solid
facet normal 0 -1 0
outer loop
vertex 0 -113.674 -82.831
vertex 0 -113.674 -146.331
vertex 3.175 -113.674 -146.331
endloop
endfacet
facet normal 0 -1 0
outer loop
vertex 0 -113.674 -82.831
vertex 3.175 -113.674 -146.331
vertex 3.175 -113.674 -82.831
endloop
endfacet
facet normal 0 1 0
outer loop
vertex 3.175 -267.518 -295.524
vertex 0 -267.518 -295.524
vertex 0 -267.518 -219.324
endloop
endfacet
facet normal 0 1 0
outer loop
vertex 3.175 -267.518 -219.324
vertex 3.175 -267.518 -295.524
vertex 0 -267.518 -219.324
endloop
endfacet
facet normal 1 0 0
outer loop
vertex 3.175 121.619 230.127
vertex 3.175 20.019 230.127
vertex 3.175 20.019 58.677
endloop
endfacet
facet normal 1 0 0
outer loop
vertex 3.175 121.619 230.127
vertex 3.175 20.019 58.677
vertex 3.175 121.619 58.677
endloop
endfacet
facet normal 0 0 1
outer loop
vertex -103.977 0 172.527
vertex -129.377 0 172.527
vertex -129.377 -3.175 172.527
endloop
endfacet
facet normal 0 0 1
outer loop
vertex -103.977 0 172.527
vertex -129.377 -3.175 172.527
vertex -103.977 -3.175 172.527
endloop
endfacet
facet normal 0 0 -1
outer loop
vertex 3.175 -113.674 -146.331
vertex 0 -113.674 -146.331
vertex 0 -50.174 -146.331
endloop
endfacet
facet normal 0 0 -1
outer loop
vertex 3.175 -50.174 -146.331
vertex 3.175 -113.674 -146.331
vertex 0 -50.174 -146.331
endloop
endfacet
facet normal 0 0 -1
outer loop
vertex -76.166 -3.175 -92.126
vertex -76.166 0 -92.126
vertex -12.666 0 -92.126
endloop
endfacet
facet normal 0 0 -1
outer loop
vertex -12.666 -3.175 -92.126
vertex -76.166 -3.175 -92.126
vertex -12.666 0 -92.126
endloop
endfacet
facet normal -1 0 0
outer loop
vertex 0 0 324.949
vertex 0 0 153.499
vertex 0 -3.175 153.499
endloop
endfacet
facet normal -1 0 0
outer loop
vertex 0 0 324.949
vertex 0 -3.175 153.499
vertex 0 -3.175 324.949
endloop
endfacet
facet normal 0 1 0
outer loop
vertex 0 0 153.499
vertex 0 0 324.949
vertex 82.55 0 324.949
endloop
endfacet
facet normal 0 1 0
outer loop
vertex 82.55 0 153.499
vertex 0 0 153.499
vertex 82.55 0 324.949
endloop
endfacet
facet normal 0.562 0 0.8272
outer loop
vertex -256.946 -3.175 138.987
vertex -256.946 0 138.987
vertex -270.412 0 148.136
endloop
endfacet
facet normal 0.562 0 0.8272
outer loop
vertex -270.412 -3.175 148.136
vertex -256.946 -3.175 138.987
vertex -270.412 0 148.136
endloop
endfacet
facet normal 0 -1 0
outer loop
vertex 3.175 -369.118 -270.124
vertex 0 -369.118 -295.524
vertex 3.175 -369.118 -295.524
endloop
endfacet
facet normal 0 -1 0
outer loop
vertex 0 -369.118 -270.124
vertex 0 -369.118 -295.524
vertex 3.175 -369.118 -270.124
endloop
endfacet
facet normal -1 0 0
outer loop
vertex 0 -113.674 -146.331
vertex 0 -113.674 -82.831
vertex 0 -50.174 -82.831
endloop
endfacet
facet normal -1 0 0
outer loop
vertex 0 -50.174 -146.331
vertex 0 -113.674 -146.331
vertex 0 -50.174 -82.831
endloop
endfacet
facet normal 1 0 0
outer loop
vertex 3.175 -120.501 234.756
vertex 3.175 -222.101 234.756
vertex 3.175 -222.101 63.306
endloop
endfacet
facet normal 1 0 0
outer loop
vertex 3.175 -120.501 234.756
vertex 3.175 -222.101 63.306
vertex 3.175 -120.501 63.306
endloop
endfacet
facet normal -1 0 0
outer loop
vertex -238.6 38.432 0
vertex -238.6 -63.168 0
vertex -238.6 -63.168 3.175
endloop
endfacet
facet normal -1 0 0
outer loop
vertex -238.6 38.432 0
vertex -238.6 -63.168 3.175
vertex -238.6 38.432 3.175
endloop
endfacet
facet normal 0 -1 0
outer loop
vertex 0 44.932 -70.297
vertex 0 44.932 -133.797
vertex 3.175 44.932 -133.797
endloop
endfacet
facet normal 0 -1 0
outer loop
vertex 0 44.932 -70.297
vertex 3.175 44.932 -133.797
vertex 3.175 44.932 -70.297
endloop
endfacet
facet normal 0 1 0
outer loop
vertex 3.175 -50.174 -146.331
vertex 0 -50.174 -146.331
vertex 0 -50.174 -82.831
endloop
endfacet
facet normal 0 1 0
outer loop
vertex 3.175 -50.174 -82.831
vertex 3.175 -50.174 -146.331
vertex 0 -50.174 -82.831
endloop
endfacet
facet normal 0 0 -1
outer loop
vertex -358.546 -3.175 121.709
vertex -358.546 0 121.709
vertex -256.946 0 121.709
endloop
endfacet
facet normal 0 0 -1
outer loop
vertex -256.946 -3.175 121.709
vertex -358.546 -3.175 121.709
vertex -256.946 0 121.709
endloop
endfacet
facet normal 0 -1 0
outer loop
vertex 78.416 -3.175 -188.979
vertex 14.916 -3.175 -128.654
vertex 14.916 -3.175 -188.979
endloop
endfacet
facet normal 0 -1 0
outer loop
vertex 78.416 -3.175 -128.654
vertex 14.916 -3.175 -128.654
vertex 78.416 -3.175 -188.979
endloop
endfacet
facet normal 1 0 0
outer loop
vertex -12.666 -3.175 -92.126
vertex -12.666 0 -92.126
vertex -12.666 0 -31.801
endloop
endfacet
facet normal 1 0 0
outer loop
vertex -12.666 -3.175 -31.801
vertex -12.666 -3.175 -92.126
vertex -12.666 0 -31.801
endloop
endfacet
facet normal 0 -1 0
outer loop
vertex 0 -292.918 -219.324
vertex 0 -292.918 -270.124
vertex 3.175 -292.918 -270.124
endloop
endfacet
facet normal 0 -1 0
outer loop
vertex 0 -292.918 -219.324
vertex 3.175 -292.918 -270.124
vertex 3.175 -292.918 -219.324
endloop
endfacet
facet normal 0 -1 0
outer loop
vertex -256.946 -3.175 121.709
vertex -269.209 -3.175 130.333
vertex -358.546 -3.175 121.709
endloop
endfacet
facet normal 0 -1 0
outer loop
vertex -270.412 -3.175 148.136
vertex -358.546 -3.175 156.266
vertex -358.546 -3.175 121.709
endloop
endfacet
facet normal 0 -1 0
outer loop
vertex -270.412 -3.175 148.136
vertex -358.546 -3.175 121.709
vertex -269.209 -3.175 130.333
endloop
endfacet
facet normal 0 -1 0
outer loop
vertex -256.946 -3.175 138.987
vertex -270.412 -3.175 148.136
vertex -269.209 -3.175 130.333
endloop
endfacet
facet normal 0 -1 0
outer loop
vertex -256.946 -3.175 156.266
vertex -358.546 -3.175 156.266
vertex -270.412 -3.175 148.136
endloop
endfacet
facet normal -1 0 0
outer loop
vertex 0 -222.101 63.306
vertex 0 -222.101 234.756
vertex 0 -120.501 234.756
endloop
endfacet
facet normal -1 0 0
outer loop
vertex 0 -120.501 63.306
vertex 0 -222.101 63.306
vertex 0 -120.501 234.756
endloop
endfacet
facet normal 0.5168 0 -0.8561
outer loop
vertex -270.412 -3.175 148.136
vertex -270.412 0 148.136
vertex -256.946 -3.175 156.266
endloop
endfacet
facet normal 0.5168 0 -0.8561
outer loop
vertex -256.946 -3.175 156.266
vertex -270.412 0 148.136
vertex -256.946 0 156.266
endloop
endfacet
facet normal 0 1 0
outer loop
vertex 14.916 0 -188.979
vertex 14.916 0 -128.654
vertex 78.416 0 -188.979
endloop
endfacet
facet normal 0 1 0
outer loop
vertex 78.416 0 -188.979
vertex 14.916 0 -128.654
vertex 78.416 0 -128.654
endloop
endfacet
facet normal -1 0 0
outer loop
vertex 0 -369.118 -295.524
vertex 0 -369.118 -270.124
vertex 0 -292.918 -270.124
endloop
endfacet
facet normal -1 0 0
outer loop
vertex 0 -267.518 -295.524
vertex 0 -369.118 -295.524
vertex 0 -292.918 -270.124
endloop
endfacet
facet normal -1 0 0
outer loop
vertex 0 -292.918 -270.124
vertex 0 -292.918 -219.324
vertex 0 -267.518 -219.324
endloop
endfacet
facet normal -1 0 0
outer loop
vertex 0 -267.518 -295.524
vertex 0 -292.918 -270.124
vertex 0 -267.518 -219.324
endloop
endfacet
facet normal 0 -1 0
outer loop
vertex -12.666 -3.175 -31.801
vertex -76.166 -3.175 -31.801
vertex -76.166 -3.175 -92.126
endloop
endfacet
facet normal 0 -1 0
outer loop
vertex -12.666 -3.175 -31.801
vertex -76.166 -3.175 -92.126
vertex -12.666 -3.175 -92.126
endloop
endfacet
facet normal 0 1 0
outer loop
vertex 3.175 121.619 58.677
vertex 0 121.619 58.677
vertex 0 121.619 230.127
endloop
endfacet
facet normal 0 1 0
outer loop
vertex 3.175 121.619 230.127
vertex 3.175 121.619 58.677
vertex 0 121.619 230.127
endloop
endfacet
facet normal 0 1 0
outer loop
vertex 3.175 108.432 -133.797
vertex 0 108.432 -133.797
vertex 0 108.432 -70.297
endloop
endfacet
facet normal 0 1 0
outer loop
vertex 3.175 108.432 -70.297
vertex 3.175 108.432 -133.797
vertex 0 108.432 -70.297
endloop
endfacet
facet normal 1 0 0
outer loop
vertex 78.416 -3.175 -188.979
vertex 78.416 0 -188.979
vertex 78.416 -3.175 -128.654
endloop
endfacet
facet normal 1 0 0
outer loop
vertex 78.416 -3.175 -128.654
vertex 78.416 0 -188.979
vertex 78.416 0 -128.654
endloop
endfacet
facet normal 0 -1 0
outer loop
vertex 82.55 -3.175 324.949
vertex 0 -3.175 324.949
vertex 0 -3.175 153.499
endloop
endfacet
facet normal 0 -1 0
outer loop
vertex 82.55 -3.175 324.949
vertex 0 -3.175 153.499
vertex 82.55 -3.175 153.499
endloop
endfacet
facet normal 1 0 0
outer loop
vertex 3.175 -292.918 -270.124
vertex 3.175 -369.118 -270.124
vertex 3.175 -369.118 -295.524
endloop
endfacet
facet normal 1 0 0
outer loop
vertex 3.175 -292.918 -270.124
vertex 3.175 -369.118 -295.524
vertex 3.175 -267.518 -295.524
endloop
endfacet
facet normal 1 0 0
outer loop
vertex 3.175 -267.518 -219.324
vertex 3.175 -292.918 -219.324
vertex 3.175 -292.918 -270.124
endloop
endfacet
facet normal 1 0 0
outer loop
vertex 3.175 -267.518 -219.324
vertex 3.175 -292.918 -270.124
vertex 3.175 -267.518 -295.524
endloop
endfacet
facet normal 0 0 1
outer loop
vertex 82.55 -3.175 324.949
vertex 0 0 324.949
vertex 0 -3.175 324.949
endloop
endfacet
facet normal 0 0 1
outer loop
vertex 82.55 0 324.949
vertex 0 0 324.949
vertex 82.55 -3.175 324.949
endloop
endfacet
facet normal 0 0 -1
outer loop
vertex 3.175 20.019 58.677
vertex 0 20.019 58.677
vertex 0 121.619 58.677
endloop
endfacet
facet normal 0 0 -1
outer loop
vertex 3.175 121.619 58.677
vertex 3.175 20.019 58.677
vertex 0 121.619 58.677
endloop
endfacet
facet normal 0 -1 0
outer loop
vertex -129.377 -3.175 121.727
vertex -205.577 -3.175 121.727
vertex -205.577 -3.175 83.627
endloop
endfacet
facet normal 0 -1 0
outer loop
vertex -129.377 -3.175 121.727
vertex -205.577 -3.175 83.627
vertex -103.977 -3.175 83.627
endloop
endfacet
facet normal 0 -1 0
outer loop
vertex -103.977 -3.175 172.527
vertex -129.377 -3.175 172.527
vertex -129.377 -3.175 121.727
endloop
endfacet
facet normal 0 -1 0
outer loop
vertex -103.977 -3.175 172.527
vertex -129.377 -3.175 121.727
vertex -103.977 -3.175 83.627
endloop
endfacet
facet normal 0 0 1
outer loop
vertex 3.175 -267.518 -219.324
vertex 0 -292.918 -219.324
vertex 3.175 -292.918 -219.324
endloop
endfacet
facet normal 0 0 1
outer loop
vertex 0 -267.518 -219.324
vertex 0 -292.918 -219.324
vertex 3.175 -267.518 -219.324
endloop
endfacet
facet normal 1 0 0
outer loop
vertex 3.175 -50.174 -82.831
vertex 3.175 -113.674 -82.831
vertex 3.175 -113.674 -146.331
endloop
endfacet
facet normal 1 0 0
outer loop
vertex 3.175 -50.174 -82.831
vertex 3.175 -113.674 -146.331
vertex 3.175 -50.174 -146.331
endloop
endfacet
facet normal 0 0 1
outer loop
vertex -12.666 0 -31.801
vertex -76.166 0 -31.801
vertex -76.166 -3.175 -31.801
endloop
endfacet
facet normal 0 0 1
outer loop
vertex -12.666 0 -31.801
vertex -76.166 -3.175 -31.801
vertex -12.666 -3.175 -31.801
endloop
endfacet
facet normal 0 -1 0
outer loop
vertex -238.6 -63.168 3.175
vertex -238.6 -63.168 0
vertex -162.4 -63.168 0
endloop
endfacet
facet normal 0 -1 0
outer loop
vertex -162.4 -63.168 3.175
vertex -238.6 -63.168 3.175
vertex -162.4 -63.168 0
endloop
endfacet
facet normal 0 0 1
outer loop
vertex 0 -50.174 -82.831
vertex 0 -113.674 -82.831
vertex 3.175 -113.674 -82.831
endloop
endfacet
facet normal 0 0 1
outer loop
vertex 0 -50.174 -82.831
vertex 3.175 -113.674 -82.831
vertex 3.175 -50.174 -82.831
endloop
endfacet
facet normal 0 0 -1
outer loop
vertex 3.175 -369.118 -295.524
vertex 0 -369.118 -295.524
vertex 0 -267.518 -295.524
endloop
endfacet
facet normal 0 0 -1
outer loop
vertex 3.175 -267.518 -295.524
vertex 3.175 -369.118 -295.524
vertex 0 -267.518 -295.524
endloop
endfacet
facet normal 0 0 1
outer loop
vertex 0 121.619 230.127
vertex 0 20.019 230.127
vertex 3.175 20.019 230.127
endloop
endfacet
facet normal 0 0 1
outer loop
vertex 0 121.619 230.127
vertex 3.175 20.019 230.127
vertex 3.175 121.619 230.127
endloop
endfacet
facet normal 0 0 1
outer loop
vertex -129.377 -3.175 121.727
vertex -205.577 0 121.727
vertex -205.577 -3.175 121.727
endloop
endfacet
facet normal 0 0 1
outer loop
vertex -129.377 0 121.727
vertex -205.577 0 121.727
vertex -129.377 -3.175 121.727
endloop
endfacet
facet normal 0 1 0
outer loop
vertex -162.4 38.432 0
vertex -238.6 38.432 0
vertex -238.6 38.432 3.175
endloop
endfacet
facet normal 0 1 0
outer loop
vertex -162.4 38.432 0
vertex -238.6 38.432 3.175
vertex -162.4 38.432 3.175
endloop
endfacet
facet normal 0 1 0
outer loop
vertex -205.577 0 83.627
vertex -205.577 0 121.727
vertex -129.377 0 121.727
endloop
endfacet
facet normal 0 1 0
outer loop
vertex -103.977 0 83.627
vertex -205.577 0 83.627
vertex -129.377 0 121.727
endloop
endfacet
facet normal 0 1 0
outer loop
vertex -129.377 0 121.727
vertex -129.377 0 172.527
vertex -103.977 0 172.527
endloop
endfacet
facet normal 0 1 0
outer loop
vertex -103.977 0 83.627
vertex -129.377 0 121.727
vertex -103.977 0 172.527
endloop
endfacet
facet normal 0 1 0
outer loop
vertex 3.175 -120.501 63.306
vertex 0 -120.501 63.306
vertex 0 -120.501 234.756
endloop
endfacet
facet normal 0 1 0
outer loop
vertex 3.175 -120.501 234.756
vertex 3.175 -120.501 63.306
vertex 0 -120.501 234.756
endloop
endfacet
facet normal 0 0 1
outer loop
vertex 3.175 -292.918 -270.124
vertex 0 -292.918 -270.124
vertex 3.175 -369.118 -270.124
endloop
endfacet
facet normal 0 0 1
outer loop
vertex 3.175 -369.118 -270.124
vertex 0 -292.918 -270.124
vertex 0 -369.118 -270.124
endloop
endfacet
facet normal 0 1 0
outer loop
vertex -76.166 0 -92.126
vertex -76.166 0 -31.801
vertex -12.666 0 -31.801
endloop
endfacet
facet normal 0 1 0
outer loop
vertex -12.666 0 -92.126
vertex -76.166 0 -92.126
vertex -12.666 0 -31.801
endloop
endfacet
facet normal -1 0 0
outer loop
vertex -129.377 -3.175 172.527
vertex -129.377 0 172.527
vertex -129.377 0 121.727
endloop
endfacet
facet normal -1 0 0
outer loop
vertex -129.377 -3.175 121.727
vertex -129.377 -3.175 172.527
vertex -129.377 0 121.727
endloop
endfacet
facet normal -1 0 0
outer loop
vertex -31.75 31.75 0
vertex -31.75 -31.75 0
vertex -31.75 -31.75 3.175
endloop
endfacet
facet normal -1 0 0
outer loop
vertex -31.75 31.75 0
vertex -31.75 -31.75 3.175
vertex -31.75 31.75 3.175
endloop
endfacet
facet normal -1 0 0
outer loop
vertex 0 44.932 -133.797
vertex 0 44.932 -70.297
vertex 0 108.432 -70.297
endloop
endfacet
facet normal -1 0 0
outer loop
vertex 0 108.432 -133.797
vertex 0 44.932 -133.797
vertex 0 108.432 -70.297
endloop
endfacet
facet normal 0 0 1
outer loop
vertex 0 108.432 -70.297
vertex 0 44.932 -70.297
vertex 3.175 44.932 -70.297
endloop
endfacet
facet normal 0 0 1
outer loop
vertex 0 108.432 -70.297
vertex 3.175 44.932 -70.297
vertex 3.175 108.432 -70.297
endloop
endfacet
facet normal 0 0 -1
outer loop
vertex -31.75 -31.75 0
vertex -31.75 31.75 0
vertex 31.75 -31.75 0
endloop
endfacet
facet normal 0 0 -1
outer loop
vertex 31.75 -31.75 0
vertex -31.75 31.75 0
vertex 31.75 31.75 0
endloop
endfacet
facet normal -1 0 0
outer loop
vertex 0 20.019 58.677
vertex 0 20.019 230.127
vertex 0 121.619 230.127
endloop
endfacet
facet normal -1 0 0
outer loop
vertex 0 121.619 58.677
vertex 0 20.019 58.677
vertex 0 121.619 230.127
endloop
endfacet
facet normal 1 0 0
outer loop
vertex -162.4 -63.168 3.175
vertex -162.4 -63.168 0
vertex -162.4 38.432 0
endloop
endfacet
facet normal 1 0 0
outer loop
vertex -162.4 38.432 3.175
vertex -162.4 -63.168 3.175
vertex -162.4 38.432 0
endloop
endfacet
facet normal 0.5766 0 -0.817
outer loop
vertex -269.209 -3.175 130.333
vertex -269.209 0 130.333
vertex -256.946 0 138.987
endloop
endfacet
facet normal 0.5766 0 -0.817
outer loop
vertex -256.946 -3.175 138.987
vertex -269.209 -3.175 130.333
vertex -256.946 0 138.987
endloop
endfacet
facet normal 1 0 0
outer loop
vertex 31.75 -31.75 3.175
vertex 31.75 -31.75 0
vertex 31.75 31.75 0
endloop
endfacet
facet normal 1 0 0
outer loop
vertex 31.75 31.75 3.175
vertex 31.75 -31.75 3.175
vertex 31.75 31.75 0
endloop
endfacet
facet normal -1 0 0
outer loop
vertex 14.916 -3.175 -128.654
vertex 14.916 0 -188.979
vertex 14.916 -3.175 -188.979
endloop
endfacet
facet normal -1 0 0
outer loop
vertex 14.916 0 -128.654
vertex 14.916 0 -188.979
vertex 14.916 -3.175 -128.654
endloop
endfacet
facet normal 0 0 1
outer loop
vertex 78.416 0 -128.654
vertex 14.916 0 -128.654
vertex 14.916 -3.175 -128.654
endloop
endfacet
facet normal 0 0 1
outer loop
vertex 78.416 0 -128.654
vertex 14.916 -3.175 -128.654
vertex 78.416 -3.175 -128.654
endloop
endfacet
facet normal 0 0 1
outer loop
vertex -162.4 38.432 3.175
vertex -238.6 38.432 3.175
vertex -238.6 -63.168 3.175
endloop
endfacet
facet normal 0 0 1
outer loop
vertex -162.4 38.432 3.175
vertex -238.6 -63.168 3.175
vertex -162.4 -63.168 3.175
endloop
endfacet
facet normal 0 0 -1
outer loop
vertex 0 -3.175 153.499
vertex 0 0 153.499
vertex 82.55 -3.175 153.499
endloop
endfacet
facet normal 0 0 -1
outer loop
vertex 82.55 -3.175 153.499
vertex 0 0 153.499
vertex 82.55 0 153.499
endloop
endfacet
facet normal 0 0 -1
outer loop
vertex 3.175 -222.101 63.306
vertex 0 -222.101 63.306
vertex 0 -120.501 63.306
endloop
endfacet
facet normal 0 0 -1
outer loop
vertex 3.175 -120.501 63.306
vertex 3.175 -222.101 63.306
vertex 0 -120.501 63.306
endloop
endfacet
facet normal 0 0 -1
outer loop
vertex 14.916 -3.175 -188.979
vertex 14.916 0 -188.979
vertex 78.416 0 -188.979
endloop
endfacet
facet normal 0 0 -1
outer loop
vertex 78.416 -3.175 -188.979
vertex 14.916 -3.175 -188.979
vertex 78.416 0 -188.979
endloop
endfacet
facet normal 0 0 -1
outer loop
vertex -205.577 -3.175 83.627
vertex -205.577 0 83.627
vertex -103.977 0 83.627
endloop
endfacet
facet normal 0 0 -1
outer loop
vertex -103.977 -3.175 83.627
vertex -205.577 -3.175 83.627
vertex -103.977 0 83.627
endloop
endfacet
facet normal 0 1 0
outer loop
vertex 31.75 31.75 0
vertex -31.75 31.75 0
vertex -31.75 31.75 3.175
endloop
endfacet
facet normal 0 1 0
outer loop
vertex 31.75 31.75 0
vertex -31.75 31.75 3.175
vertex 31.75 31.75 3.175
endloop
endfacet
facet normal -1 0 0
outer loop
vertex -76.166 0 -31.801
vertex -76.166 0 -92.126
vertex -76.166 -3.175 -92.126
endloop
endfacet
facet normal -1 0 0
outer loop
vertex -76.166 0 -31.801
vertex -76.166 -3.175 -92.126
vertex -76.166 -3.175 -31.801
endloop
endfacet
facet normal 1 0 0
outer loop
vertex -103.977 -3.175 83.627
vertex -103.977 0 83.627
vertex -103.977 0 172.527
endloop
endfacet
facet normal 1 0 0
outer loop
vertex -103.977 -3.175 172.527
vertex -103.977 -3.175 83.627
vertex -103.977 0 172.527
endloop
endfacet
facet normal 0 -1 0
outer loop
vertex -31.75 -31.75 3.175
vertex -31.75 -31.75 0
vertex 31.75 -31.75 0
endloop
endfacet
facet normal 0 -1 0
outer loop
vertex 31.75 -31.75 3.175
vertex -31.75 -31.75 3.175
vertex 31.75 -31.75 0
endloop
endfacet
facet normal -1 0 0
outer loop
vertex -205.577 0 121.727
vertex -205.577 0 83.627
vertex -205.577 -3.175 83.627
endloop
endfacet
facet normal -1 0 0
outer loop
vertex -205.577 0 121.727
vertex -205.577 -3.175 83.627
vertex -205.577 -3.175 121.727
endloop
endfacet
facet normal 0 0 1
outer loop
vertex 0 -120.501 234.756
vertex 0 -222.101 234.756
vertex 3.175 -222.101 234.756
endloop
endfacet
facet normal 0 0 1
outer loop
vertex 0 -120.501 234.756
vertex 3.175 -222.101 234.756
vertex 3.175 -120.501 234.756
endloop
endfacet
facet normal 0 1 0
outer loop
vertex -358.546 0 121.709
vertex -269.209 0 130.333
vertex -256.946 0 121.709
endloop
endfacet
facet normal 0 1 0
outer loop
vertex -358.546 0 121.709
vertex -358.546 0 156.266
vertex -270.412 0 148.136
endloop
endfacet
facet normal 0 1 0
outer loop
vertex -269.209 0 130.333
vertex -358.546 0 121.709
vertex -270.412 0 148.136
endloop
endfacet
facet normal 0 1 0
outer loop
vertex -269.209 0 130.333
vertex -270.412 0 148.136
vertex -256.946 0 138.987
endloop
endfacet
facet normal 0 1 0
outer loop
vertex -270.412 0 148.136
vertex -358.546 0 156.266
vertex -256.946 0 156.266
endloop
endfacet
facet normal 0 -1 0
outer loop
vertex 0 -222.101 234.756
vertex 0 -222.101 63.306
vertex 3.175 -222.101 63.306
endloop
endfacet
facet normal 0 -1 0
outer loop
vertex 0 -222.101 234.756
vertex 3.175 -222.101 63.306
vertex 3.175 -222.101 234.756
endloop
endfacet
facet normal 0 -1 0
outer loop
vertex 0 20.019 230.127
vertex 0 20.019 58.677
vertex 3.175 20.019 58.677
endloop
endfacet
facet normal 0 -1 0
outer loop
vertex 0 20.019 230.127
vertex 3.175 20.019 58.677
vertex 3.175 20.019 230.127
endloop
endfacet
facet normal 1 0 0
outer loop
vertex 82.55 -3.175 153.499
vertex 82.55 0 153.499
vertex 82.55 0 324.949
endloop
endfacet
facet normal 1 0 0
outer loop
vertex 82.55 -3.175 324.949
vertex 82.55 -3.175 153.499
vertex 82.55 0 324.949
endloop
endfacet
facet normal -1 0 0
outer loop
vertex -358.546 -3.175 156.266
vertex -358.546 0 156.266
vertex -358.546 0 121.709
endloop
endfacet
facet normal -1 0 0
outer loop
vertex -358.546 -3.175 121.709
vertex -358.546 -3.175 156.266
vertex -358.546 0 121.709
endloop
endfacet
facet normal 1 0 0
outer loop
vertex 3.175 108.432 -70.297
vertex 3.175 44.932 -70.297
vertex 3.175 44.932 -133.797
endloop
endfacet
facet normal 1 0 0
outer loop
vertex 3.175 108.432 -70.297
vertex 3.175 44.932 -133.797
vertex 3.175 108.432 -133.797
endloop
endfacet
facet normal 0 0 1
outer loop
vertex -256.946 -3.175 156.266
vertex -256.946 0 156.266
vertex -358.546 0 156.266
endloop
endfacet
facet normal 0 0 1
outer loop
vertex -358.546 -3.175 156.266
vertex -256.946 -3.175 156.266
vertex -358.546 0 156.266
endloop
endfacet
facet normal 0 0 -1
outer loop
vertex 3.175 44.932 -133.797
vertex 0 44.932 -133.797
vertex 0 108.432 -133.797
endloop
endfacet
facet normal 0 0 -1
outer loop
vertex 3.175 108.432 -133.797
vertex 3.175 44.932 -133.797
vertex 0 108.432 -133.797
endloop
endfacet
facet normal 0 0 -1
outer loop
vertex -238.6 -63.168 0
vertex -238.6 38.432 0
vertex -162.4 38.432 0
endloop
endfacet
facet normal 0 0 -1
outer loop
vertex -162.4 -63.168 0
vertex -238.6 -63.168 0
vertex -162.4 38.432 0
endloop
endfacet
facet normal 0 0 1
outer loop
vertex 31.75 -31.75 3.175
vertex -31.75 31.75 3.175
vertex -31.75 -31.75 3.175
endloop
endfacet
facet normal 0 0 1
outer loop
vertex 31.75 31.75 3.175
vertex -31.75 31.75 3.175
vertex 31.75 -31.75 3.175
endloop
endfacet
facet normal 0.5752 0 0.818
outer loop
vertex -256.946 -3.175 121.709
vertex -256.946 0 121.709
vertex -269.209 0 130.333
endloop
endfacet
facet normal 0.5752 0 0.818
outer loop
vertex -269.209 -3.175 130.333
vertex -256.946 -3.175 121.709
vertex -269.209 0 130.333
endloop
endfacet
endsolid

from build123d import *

# Parameters (mm, degrees)
F0_W      = 63.5
F0_H      = 63.5
F1_DEPTH  = 3.175
F2_W      = 63.5
F2_H      = 60.325
F3_DEPTH  = 3.175
F4_DEPTH  = 3.175
F5_W      = 63.5
F5_H      = 63.5
F6_DEPTH  = 3.175
F0_W_2    = 76.2
F0_H_2    = 101.6
F7_DEPTH  = 3.175
F5_W_2    = 101.6
F5_H_2    = 171.45
F8_DEPTH  = 3.175
F9_DEPTH  = 3.175
F2_W_2    = 82.55
F2_H_2    = 171.45
F10_DEPTH = 3.175
F5_W_3    = 76.2
F5_H_3    = 25.4
F5_W_4    = 25.4
F5_H_4    = 50.8
F11_DEPTH = 3.175
F2_W_3    = 25.4
F2_H_3    = 50.8
F2_H_4    = 38.1
F2_W_4    = 76.2
F12_DEPTH = 3.175
F13_DEPTH = 3.175


with BuildPart() as f1:
    # F0 (on Top) → F1 (new body)
    with BuildSketch(Plane.XY):
        Rectangle(F0_W, F0_H)
    extrude(amount=F1_DEPTH)


with BuildPart() as f3:
    # F2 (on Front) → F3 (new body)
    with BuildSketch(Plane.XZ):
        with Locations((-44.416024, -61.963391)):
            Rectangle(F2_W, F2_H)
    extrude(amount=F3_DEPTH)


with BuildPart() as f4:
    # F2 (on Front) → F4 (new body)
    with BuildSketch(Plane.XZ):
        with Locations((46.665526, -158.81647)):
            Rectangle(F2_W, F2_H)
    extrude(amount=F4_DEPTH)


with BuildPart() as f6:
    # F5 (on Right) → F6 (new body)
    with BuildSketch(Plane.YZ):
        with Locations((-81.92368, -114.581206)):
            Rectangle(F5_W, F5_H)
        with Locations((76.681532, -102.047331)):
            Rectangle(F5_W, F5_H)
    extrude(amount=F6_DEPTH)


with BuildPart() as f7:
    # F0 (on Top) → F7 (new body)
    with BuildSketch(Plane.XY):
        with Locations((-200.500001, -12.367736)):
            Rectangle(F0_W_2, F0_H_2)
    extrude(amount=F7_DEPTH)


with BuildPart() as f8:
    # F5 (on Right) → F8 (new body)
    with BuildSketch(Plane.YZ):
        with Locations((70.818697, 144.401898)):
            Rectangle(F5_W_2, F5_H_2)
    extrude(amount=F8_DEPTH)


with BuildPart() as f9:
    # F5 (on Right) → F9 (new body)
    with BuildSketch(Plane.YZ):
        with Locations((-171.301055, 149.031481)):
            Rectangle(F5_W_2, F5_H_2)
    extrude(amount=F9_DEPTH)


with BuildPart() as f10:
    # F2 (on Front) → F10 (new body)
    with BuildSketch(Plane.XZ):
        with Locations((41.275, 239.22356)):
            Rectangle(F2_W_2, F2_H_2)
    extrude(amount=F10_DEPTH)


with BuildPart() as f11:
    # F5 (on Right) → F11 (new body)
    with BuildSketch(Plane.YZ):
        with Locations((-331.017886, -282.823673)):
            Rectangle(F5_W_3, F5_H_3)
        with Locations((-280.217886, -282.823673)):
            Rectangle(F5_W_4, F5_H_3)
        with Locations((-280.217886, -244.723673)):
            Rectangle(F5_W_4, F5_H_4)
    extrude(amount=F11_DEPTH)


with BuildPart() as f12:
    # F2 (on Front) → F12 (new body)
    with BuildSketch(Plane.XZ):
        with Locations((-116.676688, 147.127164)):
            Rectangle(F2_W_3, F2_H_3)
        with Locations((-116.676688, 102.677164)):
            Rectangle(F2_W_3, F2_H_4)
        with Locations((-167.476688, 102.677164)):
            Rectangle(F2_W_4, F2_H_4)
    extrude(amount=F12_DEPTH)


with BuildPart() as f13:
    # F2 (on Front) → F13 (new body)
    with BuildSketch(Plane.XZ):
        Polygon((-256.945721, 156.265825), (-358.545721, 156.265825), (-358.545721, 121.708661), (-256.945721, 121.708661), (-269.209168, 130.333126), (-256.945721, 138.987243), (-270.412317, 148.136467), align=None)
    extrude(amount=F13_DEPTH)


solid = Compound([f1.part, f3.part, f4.part, f6.part, f7.part, f8.part, f9.part, f10.part, f11.part, f12.part, f13.part])
